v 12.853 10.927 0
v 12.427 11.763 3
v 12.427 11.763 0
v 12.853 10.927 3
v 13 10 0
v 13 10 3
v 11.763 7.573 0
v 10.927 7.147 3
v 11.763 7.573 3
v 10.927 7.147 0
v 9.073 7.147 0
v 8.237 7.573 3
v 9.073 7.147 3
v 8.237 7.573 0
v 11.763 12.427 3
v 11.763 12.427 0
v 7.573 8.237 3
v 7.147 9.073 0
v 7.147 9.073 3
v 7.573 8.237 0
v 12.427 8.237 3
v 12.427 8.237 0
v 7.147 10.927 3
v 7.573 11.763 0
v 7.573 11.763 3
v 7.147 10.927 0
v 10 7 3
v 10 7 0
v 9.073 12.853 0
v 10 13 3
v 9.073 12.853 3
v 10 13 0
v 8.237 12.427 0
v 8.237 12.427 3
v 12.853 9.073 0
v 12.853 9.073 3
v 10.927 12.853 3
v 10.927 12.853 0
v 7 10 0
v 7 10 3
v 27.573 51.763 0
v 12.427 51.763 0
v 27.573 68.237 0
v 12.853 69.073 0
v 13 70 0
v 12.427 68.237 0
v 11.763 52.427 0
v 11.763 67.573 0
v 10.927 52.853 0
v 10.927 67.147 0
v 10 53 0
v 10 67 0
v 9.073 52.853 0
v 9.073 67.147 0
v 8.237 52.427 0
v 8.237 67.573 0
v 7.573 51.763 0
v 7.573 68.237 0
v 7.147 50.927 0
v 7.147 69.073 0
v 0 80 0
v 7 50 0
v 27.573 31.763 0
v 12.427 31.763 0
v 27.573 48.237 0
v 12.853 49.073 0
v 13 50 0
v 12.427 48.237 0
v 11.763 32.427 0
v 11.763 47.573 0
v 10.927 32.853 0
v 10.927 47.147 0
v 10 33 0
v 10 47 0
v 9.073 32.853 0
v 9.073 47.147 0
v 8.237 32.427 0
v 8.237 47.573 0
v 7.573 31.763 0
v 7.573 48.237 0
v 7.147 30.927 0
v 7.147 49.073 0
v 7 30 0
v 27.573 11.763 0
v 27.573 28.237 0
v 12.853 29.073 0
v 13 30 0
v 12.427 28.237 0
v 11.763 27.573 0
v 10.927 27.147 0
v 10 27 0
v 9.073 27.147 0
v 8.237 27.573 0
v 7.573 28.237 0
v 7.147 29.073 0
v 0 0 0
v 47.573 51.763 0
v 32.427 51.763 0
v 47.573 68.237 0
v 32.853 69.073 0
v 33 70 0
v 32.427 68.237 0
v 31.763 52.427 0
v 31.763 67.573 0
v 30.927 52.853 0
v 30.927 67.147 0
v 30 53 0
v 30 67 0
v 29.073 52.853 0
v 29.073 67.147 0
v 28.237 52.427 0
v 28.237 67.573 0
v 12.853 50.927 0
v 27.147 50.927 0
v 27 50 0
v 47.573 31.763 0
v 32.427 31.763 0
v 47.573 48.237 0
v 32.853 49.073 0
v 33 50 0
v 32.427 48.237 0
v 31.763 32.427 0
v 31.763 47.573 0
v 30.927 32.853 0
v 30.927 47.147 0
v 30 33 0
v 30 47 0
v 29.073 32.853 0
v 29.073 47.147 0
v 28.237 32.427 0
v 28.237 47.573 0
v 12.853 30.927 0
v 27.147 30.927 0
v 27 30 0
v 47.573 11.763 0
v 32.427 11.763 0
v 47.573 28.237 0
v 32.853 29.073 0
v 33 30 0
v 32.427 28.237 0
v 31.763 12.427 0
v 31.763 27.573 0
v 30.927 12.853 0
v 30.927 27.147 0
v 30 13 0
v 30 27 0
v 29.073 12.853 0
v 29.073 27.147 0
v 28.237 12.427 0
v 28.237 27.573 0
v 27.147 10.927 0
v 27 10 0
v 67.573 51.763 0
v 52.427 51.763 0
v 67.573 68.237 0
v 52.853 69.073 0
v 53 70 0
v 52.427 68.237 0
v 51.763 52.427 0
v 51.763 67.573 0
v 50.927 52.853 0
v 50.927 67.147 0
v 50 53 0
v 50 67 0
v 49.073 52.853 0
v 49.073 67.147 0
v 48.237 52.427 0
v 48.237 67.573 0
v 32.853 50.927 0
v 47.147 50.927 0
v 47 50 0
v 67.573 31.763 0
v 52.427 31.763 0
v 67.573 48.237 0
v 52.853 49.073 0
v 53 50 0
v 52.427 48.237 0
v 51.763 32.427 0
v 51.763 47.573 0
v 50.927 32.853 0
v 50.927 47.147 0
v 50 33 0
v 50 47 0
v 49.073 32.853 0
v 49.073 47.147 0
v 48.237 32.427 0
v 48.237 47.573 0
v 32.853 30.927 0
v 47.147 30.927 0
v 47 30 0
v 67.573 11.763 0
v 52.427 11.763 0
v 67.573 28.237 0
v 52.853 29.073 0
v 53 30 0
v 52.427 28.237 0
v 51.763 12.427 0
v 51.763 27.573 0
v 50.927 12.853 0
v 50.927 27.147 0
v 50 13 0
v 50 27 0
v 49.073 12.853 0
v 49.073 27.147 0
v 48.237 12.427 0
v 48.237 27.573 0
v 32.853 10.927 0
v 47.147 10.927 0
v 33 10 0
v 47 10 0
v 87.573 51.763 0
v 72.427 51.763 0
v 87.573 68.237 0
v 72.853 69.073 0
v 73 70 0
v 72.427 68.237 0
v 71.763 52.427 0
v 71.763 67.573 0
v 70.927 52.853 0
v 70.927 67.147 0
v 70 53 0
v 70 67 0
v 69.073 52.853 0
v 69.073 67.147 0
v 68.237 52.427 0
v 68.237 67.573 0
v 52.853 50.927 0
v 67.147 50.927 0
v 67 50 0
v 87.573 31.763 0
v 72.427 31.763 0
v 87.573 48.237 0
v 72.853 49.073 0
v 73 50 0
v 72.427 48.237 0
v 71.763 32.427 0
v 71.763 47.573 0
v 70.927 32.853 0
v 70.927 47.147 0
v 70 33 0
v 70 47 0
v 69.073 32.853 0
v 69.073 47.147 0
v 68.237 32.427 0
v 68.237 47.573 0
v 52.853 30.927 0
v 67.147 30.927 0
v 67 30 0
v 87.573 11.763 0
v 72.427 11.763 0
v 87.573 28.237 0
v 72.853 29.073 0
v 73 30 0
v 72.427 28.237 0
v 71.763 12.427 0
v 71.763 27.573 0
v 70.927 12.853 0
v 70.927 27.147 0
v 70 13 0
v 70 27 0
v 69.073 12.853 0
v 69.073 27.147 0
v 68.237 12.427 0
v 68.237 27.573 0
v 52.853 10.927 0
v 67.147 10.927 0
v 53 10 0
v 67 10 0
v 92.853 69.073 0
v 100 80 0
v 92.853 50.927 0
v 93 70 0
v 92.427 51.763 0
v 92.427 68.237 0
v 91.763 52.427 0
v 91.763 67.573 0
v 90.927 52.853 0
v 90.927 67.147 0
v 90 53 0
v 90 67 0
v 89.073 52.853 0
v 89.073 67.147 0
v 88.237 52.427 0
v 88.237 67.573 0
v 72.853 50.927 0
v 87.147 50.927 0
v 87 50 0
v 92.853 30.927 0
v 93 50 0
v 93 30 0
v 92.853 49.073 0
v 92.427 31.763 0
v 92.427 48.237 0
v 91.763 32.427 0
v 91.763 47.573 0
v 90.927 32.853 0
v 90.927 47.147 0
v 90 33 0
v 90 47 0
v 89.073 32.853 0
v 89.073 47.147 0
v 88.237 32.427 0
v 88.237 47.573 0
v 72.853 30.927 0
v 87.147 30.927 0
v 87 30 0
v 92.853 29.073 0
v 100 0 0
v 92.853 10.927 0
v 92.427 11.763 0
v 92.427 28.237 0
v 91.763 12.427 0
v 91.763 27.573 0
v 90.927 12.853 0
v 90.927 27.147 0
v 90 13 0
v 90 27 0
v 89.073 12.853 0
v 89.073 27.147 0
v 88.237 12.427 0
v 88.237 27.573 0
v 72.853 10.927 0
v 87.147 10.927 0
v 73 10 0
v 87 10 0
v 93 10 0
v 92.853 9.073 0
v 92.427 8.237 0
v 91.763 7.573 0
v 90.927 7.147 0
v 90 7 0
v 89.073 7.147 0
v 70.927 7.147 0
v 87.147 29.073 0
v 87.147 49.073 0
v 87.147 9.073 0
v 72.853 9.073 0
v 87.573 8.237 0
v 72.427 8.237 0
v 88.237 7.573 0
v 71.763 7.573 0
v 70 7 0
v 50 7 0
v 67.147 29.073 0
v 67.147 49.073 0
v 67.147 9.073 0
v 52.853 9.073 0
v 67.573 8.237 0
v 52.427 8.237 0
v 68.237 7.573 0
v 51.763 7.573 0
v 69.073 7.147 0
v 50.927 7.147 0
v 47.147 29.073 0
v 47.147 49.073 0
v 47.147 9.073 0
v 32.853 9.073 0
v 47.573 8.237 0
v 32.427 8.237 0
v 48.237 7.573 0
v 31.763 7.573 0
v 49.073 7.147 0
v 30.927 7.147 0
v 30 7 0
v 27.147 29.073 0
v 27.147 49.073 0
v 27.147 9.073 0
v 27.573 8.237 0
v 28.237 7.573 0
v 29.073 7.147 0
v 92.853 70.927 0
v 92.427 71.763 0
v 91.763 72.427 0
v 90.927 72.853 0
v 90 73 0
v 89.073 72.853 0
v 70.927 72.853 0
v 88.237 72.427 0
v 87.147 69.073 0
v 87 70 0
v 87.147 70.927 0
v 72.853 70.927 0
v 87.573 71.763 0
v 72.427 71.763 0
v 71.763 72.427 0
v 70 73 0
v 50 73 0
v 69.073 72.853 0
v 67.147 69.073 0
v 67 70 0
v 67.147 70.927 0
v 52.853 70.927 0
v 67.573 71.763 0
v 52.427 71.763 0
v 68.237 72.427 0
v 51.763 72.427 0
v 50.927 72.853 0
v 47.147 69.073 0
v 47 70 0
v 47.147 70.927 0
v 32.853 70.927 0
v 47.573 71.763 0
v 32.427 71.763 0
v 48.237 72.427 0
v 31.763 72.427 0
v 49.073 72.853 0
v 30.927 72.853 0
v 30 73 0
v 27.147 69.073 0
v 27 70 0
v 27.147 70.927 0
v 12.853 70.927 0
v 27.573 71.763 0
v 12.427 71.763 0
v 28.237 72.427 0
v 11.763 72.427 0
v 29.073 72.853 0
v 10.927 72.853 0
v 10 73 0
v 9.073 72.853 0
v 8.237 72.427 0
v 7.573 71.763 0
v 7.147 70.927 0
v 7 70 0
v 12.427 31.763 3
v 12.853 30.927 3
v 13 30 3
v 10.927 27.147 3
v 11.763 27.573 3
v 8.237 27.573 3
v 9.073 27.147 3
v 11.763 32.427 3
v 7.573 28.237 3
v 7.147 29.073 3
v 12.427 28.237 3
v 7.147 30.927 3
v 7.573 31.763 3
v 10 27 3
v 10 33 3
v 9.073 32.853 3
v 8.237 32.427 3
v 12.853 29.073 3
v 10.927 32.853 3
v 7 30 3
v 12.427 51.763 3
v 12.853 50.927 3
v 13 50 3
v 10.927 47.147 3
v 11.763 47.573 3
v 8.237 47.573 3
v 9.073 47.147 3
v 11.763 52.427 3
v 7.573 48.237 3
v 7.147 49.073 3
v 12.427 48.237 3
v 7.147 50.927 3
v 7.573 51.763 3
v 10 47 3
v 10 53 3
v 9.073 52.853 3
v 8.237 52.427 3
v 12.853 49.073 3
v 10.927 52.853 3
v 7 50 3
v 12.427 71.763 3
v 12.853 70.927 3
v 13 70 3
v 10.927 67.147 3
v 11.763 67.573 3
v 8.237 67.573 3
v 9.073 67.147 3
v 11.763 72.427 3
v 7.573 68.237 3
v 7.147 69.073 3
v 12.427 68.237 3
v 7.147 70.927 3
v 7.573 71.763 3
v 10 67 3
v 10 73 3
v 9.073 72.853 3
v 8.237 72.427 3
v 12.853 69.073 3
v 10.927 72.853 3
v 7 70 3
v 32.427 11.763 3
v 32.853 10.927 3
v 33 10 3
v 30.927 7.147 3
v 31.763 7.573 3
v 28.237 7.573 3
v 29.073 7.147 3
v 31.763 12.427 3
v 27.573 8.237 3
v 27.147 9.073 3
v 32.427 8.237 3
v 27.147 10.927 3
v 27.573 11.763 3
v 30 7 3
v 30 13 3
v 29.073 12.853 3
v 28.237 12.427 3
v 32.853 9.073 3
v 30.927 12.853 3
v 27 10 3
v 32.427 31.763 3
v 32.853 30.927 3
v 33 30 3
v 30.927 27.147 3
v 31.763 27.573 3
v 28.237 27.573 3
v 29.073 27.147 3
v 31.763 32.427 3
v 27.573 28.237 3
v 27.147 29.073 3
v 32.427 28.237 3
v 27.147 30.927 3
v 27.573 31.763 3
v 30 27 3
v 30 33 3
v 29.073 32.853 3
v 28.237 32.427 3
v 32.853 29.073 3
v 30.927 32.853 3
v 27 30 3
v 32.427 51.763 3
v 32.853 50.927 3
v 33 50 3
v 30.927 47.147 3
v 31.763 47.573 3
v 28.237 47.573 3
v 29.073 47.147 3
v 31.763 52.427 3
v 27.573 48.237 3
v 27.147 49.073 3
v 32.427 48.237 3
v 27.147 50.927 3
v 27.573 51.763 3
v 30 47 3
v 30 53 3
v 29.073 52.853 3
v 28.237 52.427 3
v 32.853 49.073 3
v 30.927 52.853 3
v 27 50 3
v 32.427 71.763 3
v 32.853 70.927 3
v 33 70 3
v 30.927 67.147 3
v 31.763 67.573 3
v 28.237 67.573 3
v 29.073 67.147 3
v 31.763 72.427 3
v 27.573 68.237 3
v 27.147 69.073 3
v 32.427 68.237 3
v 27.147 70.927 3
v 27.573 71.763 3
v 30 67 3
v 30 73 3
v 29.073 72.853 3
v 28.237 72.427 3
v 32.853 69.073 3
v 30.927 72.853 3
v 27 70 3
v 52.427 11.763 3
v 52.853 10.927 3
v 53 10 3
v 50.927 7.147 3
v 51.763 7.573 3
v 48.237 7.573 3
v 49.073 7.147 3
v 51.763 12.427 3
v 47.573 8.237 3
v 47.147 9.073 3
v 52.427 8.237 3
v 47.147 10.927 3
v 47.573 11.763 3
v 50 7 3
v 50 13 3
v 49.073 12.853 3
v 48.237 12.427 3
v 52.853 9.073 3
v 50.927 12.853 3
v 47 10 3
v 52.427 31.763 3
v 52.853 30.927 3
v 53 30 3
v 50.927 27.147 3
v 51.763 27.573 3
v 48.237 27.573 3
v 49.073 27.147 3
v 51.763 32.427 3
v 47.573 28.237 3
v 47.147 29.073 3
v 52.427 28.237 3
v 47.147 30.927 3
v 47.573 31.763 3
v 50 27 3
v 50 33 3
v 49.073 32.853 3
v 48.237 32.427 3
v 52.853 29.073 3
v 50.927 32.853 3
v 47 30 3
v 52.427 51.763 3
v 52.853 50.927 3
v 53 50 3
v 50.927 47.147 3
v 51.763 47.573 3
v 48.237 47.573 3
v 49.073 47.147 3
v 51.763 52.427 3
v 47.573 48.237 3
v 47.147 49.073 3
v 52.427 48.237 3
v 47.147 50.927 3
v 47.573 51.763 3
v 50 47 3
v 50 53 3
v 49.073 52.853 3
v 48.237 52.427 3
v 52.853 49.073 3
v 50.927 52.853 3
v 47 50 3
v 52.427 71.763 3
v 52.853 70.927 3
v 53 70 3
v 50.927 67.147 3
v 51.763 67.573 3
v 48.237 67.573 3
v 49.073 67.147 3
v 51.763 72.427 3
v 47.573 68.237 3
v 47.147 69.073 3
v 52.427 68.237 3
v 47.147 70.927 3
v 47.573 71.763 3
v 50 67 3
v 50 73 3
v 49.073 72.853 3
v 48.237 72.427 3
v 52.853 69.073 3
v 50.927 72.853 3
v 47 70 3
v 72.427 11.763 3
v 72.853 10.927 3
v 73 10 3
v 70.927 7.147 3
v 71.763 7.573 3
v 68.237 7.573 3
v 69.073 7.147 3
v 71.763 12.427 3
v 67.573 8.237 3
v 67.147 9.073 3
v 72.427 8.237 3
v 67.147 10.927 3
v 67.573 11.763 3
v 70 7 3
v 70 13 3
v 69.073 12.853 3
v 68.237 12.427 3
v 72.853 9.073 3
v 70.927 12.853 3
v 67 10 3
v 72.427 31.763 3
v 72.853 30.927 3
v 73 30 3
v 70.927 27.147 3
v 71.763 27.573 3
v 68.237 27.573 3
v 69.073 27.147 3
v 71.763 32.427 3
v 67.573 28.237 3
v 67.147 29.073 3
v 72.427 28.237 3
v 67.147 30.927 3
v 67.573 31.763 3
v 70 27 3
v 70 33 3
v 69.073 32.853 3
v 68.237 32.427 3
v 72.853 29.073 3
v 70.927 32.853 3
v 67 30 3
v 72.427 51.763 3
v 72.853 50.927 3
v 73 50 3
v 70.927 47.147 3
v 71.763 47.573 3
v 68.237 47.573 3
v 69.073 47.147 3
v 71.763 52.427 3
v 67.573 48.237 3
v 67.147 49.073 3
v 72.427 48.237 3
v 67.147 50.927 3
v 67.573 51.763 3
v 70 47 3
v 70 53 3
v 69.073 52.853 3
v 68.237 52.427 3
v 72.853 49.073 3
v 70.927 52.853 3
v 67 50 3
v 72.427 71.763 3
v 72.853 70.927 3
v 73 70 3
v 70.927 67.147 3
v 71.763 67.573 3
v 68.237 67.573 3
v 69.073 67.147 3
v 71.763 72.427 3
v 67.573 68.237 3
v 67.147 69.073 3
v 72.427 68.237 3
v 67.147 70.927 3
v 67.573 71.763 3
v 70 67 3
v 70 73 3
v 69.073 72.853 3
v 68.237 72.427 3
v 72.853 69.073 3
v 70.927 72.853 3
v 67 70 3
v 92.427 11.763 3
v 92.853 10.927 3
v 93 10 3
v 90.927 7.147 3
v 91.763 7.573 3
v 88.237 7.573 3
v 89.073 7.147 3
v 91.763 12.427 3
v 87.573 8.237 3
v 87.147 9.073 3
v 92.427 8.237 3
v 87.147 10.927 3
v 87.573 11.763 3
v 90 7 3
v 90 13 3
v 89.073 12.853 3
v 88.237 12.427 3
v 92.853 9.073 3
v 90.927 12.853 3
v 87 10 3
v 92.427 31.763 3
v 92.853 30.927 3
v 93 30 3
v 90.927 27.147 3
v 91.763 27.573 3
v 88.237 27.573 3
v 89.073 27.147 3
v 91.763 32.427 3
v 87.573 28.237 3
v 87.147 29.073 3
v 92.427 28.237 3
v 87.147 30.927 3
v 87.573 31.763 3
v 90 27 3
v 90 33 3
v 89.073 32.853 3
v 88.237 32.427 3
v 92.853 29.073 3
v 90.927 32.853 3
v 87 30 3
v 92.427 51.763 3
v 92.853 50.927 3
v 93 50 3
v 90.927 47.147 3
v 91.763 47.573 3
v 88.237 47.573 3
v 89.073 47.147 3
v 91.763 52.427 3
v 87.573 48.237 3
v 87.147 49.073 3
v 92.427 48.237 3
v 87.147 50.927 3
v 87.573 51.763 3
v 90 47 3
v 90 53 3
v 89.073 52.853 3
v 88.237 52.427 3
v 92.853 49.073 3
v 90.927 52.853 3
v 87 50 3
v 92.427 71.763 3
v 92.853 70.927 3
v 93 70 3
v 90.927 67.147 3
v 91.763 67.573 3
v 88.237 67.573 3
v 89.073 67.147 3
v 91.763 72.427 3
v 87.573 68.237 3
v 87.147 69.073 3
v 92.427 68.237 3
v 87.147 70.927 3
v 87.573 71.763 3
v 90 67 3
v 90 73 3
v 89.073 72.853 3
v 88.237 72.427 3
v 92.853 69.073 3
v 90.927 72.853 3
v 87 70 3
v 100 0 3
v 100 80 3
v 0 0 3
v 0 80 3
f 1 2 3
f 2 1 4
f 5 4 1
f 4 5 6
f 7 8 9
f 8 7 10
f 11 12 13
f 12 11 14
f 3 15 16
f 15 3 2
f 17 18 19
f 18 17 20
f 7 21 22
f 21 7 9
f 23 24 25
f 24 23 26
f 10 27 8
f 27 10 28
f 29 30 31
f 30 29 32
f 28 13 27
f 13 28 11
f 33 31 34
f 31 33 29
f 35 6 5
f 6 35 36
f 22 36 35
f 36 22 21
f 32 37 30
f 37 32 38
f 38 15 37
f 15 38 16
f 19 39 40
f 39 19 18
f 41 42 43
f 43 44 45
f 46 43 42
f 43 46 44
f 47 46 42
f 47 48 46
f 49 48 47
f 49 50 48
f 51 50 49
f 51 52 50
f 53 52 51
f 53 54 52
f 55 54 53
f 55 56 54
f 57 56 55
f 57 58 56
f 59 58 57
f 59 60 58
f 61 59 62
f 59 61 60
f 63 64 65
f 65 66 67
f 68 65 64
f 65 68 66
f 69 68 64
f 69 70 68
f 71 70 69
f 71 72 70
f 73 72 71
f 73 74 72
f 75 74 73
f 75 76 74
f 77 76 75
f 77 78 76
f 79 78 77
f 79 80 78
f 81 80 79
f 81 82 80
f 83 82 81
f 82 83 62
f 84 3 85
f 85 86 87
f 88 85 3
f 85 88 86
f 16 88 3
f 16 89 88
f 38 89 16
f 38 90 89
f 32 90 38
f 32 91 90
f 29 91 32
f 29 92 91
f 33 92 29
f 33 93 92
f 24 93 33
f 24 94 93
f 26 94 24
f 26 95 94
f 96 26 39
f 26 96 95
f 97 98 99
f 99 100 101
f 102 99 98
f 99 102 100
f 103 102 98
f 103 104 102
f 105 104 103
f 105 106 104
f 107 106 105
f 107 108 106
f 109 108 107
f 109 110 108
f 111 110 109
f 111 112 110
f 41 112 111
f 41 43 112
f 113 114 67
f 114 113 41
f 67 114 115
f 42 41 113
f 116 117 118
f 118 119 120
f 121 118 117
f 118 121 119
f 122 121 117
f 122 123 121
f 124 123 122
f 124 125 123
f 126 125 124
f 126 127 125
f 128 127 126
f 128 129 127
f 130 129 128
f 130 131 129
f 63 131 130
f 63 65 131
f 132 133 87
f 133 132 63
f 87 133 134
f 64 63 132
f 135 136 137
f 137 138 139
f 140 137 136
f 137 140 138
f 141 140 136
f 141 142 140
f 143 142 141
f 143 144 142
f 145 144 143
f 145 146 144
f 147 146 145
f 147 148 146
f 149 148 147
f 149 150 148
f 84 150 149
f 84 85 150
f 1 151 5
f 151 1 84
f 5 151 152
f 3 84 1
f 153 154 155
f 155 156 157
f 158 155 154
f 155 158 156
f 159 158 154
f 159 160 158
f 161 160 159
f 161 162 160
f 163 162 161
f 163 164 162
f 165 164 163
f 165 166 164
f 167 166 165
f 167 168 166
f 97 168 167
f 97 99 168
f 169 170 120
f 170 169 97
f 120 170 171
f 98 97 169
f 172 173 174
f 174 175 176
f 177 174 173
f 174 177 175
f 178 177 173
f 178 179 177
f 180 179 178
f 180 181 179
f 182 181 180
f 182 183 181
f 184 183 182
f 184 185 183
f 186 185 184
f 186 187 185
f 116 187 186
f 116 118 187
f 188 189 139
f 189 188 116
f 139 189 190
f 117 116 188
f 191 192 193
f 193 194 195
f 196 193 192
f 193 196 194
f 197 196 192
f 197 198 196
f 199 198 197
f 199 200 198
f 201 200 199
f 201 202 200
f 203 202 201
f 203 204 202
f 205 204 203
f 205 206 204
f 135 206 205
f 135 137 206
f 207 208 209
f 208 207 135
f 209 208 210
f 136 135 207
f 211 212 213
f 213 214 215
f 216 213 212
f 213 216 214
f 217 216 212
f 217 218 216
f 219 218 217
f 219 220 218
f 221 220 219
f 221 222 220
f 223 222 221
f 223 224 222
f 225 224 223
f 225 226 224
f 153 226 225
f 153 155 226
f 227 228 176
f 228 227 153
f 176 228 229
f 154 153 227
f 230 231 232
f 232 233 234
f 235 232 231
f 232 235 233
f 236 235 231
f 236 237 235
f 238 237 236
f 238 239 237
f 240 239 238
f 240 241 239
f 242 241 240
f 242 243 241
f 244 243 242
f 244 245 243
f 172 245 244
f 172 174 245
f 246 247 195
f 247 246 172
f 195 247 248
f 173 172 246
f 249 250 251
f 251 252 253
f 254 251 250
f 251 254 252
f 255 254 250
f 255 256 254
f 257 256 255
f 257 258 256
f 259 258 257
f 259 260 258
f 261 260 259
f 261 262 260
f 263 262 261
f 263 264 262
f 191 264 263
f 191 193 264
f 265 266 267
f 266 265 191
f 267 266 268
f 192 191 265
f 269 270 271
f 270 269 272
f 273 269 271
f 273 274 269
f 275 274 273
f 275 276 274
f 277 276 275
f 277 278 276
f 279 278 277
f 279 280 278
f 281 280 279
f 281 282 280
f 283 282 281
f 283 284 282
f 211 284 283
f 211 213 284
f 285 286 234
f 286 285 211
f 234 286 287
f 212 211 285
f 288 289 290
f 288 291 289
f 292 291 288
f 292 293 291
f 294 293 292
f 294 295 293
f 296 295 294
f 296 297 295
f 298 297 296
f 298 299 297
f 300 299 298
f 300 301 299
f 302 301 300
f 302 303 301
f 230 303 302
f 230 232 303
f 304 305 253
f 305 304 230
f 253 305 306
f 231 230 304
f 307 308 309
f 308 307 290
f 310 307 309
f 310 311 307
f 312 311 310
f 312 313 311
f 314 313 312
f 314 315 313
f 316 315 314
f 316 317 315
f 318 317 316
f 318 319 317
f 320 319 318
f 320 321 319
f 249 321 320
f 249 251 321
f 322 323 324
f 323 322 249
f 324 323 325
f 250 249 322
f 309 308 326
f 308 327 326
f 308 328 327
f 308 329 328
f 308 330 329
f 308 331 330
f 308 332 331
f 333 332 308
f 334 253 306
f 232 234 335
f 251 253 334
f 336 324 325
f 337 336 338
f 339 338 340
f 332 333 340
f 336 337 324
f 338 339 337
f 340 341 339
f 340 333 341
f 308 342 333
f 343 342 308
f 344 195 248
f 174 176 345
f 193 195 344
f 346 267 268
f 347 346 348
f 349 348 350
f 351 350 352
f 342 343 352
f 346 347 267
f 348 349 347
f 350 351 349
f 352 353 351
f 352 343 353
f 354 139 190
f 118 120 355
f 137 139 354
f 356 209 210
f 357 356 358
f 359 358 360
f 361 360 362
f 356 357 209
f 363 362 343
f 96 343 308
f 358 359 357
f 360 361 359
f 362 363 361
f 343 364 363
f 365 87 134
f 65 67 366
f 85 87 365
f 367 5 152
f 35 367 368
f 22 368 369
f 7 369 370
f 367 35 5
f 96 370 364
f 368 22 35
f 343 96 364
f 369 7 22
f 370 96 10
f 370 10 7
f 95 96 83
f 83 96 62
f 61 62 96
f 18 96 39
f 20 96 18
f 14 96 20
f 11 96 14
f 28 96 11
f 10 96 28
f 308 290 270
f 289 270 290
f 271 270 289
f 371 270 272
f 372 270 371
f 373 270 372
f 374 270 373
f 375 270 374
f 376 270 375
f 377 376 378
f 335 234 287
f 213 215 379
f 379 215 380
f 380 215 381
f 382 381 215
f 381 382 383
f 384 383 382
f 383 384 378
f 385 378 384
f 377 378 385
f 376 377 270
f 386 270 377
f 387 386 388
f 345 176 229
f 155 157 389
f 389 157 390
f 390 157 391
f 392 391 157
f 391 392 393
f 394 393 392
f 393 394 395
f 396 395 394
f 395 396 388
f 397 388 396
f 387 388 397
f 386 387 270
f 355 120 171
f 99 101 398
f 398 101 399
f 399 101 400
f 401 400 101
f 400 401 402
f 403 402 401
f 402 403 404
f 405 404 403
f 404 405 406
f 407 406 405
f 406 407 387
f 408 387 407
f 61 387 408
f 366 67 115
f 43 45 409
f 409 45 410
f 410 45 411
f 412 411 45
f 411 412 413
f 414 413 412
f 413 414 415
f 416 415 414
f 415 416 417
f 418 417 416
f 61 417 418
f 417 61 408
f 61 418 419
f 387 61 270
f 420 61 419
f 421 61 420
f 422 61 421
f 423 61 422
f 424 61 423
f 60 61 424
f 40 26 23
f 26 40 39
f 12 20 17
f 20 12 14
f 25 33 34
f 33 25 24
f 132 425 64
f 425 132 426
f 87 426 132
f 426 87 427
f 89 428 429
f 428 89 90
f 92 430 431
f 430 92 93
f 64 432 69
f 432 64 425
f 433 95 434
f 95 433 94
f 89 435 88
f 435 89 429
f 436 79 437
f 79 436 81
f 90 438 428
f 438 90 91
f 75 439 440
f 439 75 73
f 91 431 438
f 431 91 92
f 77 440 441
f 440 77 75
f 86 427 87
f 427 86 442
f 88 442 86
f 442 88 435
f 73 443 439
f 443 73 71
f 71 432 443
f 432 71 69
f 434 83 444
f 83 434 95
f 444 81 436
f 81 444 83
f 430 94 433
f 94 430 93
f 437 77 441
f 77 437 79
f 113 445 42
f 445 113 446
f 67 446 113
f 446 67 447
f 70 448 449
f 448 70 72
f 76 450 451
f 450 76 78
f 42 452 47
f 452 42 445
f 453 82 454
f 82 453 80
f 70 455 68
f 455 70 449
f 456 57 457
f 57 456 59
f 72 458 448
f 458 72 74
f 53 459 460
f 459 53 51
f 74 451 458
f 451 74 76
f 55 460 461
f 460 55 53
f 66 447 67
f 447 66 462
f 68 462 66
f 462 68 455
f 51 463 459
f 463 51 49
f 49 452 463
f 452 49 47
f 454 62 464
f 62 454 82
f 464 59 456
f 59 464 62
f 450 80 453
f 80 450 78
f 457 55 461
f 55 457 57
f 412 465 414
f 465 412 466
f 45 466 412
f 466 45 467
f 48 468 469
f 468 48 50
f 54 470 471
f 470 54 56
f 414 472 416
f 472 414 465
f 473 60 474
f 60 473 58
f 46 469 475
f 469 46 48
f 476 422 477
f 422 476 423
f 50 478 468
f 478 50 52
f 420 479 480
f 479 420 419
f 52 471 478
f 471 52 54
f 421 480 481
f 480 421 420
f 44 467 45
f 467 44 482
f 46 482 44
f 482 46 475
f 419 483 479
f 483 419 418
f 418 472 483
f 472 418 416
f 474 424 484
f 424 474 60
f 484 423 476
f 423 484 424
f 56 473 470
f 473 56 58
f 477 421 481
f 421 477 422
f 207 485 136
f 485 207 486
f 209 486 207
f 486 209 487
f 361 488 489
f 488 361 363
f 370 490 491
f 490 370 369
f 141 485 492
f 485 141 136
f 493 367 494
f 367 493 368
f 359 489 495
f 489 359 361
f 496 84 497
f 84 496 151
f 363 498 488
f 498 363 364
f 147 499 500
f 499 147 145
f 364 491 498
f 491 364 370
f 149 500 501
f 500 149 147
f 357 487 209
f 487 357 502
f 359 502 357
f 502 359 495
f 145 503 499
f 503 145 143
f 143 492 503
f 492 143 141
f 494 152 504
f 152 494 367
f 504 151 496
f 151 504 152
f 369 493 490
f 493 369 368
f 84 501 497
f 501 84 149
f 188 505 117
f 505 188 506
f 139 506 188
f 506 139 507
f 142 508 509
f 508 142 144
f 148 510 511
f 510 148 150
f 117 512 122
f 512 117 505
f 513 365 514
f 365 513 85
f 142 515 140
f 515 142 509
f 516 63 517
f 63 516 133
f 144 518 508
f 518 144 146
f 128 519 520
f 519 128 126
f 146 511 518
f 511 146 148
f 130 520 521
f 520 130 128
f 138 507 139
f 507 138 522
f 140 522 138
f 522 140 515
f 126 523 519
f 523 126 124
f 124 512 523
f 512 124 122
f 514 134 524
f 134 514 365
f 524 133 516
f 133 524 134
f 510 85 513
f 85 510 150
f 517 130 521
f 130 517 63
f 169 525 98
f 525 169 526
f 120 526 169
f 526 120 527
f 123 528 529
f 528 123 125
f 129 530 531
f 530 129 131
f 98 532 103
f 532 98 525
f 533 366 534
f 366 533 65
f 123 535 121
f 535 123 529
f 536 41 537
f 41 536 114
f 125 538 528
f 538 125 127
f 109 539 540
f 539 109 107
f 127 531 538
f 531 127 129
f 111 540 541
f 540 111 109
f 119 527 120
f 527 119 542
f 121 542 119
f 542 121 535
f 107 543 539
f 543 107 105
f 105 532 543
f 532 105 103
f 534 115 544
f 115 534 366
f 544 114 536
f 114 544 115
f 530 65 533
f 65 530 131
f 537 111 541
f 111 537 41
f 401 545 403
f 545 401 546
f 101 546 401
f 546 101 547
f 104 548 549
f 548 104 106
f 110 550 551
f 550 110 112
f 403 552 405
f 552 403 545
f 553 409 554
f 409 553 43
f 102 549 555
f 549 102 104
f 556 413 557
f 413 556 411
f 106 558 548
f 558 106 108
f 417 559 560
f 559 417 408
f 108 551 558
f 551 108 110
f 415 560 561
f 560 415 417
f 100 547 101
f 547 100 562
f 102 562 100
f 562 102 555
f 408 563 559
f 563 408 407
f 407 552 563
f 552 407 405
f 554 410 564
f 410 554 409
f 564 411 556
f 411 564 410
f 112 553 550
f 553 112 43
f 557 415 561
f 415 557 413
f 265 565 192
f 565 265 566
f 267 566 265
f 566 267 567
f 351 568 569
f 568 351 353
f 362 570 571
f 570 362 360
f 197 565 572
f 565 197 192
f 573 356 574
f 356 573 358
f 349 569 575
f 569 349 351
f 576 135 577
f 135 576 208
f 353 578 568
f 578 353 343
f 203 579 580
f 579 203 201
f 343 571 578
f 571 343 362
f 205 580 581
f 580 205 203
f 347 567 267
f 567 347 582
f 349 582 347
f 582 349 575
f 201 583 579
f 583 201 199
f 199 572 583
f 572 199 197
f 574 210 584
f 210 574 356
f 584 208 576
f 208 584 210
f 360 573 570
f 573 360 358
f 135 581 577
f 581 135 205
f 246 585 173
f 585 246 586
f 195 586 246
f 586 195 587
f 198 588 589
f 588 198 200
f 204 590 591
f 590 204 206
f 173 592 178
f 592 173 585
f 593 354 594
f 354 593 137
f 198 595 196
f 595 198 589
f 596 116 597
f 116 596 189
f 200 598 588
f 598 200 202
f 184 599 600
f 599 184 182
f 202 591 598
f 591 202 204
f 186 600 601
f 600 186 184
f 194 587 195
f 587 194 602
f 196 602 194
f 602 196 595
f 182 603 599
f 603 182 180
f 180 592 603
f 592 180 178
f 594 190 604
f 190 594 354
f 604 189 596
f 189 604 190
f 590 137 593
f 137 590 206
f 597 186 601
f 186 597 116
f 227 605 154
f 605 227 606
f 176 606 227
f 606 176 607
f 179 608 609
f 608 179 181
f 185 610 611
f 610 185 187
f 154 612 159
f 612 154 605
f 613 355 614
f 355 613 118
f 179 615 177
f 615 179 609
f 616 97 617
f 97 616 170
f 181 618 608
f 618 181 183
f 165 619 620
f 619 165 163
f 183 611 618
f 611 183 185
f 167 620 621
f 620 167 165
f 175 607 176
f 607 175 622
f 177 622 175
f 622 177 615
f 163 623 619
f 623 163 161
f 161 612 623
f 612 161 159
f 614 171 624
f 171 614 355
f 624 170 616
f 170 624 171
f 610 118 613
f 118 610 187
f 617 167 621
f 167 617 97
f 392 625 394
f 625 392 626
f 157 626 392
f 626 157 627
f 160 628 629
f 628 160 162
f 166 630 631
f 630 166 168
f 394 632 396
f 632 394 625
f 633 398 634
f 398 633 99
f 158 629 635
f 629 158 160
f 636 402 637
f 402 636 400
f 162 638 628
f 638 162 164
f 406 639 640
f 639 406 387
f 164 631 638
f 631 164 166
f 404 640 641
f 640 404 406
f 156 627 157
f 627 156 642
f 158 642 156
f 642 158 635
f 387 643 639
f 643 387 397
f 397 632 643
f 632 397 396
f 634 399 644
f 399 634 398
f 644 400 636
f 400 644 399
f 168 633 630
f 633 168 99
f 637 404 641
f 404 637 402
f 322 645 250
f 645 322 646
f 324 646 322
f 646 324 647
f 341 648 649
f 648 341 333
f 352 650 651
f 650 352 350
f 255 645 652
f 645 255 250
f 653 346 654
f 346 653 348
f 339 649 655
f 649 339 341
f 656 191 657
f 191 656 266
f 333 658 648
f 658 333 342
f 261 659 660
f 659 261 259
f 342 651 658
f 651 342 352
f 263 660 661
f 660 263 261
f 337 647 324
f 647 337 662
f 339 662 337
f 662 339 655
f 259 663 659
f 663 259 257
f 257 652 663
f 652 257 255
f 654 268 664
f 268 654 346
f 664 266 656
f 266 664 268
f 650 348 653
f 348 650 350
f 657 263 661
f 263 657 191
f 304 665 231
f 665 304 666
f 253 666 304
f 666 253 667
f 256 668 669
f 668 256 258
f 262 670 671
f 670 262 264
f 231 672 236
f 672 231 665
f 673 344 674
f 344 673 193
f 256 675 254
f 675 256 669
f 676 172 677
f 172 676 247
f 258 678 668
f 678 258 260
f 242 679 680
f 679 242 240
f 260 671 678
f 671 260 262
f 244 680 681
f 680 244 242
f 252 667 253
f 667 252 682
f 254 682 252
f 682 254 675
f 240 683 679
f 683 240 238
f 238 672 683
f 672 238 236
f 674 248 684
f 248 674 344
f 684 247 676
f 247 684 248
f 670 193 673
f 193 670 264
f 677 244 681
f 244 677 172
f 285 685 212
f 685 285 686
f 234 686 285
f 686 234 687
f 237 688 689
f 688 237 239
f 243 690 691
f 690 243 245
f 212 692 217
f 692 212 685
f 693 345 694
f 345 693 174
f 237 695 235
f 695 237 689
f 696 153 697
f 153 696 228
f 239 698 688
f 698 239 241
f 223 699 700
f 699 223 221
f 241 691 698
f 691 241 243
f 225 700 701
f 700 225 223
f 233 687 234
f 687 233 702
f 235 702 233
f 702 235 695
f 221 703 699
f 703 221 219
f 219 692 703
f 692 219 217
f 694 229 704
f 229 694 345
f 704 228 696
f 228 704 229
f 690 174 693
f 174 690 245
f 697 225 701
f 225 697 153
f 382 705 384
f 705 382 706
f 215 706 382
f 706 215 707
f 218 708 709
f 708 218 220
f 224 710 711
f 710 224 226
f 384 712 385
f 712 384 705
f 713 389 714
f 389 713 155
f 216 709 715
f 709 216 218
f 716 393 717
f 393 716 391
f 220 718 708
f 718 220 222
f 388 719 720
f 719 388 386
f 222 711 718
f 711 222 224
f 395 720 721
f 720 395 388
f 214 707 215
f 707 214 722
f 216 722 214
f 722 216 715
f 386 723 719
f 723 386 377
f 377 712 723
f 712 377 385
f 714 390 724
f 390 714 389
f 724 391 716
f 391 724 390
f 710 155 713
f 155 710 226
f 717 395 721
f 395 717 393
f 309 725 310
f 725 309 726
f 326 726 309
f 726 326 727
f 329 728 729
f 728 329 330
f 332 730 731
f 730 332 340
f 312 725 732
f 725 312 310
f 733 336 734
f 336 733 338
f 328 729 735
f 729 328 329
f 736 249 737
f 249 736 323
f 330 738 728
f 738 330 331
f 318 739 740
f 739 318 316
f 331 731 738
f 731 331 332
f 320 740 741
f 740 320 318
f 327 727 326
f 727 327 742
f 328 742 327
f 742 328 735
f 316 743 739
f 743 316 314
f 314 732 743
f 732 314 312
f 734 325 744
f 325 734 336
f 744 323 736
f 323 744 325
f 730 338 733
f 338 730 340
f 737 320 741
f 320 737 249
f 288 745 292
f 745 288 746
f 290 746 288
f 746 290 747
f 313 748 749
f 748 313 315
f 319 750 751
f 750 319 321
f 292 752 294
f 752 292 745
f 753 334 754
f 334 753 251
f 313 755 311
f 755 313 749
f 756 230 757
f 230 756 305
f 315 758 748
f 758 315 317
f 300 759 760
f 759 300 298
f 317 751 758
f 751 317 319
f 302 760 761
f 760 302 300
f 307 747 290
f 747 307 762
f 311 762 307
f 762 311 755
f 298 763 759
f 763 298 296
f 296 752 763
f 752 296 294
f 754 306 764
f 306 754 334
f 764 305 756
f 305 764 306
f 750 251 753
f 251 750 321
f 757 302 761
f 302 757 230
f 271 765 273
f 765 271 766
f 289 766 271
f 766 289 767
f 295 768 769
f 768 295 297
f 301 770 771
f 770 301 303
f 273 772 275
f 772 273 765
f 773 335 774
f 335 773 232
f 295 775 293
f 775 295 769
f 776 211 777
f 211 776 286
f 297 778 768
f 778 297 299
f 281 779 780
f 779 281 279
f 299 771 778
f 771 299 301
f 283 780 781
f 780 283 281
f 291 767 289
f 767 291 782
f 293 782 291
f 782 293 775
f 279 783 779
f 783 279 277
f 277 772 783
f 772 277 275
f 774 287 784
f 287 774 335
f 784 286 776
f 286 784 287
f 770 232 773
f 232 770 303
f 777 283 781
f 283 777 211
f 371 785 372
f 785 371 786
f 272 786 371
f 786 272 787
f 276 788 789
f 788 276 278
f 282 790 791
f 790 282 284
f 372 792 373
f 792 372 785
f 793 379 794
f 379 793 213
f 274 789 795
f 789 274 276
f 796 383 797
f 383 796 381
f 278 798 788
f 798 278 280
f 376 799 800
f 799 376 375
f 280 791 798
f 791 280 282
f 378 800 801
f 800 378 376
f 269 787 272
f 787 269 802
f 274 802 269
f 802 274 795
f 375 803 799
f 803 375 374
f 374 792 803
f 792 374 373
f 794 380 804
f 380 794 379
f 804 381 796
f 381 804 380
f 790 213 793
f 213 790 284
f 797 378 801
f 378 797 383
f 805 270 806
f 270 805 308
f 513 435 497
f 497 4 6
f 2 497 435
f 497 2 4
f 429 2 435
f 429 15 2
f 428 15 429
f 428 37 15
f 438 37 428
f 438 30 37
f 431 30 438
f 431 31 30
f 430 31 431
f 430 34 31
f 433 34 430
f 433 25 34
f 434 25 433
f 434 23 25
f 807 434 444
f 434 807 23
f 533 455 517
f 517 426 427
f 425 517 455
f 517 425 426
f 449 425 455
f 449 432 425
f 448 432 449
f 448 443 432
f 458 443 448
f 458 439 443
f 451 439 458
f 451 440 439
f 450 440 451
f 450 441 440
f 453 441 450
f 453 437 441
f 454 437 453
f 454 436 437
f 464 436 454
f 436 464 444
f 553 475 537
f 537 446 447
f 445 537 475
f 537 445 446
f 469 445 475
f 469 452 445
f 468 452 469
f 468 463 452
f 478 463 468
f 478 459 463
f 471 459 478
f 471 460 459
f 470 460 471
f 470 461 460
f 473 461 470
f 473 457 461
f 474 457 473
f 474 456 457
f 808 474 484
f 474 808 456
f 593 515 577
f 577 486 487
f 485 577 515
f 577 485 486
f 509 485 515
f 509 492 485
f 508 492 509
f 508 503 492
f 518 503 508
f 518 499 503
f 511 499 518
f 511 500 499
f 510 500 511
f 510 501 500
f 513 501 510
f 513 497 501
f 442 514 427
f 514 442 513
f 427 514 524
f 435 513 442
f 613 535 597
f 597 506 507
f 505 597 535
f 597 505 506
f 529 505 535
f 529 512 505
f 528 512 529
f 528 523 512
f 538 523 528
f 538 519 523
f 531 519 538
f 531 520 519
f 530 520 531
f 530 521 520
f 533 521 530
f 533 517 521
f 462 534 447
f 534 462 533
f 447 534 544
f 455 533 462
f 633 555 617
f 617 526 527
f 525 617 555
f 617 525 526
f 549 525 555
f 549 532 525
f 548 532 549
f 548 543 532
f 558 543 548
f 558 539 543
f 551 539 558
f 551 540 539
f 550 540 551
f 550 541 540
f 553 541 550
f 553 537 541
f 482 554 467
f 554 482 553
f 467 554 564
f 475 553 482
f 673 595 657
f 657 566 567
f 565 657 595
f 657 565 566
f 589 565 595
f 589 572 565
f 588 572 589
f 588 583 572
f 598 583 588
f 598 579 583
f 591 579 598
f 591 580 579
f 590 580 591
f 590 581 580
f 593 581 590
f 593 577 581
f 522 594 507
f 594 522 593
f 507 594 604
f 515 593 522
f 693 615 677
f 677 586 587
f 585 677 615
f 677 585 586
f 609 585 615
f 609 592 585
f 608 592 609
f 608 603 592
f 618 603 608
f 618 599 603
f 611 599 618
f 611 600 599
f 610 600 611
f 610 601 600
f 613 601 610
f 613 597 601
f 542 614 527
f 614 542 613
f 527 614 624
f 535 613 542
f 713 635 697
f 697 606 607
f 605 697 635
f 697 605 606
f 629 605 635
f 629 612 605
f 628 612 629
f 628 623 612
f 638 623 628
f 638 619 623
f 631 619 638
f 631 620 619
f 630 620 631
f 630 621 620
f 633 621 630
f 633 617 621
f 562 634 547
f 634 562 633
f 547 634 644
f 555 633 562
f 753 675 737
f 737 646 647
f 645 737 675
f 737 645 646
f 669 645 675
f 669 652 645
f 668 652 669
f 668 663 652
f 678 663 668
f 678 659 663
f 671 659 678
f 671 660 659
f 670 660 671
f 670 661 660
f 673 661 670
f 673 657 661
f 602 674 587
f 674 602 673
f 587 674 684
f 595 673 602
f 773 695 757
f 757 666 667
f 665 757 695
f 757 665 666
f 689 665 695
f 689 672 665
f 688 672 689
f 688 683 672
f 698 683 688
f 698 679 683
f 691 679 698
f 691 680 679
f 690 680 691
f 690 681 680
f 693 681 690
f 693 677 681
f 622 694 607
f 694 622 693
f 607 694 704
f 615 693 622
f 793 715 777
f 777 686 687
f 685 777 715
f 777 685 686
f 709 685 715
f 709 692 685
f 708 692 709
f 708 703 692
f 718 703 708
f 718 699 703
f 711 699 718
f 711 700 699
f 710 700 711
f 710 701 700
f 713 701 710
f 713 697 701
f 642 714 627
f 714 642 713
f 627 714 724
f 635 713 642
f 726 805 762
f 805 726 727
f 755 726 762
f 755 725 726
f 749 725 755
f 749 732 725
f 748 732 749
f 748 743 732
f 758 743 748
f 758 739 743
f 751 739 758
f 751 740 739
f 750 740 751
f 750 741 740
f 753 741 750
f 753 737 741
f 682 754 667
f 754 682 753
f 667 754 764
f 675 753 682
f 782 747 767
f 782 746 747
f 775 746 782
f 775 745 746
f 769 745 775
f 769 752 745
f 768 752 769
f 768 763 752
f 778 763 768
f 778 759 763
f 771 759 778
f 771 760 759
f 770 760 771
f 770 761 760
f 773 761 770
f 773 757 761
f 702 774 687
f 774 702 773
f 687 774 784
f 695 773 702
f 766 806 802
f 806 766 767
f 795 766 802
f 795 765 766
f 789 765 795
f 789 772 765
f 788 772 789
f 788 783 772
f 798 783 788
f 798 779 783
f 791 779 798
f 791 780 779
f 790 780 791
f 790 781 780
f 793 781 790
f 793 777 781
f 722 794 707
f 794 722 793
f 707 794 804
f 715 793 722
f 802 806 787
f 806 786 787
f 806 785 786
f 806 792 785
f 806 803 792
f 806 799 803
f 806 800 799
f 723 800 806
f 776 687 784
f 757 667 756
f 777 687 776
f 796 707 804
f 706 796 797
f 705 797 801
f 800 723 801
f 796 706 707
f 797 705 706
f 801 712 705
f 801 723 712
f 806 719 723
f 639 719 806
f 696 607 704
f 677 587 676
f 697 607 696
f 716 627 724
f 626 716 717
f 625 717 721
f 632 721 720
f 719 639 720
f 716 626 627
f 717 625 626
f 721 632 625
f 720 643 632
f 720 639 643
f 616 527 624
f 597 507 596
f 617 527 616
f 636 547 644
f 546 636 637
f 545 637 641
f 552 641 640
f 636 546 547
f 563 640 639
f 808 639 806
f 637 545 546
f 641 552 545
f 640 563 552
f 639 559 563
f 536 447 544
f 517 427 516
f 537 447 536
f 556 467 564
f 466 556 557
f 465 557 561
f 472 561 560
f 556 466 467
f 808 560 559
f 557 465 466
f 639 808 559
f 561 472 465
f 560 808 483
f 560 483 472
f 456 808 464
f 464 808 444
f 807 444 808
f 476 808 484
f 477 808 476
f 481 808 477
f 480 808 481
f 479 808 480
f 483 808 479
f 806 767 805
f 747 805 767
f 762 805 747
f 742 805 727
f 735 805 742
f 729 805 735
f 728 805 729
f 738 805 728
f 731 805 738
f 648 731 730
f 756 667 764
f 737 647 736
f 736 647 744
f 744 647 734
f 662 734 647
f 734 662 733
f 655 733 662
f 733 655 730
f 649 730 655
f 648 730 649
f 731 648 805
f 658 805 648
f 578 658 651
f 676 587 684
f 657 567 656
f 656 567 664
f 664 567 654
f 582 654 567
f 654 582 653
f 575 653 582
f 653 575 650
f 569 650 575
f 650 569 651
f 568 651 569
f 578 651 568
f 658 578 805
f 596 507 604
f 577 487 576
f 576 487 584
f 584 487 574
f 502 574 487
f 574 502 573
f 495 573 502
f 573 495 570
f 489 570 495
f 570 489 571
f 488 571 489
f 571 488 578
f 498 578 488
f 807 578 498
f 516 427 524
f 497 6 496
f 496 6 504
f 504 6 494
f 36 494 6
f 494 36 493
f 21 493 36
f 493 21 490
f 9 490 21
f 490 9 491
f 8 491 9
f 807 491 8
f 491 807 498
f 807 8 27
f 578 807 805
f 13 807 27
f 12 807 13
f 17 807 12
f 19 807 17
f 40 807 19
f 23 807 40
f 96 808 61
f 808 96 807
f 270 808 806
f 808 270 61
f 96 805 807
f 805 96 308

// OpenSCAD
// Eduardo Blanco Bielsa - UO285176
module placa(){
    difference(){
        cube([100,80,3]);
        
        for (i =[10: 20 :100 ], j = [10: 20 :80 ]){ 
            translate([i, j, 0])
                cylinder (h = 20, d=6, $fn=20);
    }
        
    }
}
placa();
